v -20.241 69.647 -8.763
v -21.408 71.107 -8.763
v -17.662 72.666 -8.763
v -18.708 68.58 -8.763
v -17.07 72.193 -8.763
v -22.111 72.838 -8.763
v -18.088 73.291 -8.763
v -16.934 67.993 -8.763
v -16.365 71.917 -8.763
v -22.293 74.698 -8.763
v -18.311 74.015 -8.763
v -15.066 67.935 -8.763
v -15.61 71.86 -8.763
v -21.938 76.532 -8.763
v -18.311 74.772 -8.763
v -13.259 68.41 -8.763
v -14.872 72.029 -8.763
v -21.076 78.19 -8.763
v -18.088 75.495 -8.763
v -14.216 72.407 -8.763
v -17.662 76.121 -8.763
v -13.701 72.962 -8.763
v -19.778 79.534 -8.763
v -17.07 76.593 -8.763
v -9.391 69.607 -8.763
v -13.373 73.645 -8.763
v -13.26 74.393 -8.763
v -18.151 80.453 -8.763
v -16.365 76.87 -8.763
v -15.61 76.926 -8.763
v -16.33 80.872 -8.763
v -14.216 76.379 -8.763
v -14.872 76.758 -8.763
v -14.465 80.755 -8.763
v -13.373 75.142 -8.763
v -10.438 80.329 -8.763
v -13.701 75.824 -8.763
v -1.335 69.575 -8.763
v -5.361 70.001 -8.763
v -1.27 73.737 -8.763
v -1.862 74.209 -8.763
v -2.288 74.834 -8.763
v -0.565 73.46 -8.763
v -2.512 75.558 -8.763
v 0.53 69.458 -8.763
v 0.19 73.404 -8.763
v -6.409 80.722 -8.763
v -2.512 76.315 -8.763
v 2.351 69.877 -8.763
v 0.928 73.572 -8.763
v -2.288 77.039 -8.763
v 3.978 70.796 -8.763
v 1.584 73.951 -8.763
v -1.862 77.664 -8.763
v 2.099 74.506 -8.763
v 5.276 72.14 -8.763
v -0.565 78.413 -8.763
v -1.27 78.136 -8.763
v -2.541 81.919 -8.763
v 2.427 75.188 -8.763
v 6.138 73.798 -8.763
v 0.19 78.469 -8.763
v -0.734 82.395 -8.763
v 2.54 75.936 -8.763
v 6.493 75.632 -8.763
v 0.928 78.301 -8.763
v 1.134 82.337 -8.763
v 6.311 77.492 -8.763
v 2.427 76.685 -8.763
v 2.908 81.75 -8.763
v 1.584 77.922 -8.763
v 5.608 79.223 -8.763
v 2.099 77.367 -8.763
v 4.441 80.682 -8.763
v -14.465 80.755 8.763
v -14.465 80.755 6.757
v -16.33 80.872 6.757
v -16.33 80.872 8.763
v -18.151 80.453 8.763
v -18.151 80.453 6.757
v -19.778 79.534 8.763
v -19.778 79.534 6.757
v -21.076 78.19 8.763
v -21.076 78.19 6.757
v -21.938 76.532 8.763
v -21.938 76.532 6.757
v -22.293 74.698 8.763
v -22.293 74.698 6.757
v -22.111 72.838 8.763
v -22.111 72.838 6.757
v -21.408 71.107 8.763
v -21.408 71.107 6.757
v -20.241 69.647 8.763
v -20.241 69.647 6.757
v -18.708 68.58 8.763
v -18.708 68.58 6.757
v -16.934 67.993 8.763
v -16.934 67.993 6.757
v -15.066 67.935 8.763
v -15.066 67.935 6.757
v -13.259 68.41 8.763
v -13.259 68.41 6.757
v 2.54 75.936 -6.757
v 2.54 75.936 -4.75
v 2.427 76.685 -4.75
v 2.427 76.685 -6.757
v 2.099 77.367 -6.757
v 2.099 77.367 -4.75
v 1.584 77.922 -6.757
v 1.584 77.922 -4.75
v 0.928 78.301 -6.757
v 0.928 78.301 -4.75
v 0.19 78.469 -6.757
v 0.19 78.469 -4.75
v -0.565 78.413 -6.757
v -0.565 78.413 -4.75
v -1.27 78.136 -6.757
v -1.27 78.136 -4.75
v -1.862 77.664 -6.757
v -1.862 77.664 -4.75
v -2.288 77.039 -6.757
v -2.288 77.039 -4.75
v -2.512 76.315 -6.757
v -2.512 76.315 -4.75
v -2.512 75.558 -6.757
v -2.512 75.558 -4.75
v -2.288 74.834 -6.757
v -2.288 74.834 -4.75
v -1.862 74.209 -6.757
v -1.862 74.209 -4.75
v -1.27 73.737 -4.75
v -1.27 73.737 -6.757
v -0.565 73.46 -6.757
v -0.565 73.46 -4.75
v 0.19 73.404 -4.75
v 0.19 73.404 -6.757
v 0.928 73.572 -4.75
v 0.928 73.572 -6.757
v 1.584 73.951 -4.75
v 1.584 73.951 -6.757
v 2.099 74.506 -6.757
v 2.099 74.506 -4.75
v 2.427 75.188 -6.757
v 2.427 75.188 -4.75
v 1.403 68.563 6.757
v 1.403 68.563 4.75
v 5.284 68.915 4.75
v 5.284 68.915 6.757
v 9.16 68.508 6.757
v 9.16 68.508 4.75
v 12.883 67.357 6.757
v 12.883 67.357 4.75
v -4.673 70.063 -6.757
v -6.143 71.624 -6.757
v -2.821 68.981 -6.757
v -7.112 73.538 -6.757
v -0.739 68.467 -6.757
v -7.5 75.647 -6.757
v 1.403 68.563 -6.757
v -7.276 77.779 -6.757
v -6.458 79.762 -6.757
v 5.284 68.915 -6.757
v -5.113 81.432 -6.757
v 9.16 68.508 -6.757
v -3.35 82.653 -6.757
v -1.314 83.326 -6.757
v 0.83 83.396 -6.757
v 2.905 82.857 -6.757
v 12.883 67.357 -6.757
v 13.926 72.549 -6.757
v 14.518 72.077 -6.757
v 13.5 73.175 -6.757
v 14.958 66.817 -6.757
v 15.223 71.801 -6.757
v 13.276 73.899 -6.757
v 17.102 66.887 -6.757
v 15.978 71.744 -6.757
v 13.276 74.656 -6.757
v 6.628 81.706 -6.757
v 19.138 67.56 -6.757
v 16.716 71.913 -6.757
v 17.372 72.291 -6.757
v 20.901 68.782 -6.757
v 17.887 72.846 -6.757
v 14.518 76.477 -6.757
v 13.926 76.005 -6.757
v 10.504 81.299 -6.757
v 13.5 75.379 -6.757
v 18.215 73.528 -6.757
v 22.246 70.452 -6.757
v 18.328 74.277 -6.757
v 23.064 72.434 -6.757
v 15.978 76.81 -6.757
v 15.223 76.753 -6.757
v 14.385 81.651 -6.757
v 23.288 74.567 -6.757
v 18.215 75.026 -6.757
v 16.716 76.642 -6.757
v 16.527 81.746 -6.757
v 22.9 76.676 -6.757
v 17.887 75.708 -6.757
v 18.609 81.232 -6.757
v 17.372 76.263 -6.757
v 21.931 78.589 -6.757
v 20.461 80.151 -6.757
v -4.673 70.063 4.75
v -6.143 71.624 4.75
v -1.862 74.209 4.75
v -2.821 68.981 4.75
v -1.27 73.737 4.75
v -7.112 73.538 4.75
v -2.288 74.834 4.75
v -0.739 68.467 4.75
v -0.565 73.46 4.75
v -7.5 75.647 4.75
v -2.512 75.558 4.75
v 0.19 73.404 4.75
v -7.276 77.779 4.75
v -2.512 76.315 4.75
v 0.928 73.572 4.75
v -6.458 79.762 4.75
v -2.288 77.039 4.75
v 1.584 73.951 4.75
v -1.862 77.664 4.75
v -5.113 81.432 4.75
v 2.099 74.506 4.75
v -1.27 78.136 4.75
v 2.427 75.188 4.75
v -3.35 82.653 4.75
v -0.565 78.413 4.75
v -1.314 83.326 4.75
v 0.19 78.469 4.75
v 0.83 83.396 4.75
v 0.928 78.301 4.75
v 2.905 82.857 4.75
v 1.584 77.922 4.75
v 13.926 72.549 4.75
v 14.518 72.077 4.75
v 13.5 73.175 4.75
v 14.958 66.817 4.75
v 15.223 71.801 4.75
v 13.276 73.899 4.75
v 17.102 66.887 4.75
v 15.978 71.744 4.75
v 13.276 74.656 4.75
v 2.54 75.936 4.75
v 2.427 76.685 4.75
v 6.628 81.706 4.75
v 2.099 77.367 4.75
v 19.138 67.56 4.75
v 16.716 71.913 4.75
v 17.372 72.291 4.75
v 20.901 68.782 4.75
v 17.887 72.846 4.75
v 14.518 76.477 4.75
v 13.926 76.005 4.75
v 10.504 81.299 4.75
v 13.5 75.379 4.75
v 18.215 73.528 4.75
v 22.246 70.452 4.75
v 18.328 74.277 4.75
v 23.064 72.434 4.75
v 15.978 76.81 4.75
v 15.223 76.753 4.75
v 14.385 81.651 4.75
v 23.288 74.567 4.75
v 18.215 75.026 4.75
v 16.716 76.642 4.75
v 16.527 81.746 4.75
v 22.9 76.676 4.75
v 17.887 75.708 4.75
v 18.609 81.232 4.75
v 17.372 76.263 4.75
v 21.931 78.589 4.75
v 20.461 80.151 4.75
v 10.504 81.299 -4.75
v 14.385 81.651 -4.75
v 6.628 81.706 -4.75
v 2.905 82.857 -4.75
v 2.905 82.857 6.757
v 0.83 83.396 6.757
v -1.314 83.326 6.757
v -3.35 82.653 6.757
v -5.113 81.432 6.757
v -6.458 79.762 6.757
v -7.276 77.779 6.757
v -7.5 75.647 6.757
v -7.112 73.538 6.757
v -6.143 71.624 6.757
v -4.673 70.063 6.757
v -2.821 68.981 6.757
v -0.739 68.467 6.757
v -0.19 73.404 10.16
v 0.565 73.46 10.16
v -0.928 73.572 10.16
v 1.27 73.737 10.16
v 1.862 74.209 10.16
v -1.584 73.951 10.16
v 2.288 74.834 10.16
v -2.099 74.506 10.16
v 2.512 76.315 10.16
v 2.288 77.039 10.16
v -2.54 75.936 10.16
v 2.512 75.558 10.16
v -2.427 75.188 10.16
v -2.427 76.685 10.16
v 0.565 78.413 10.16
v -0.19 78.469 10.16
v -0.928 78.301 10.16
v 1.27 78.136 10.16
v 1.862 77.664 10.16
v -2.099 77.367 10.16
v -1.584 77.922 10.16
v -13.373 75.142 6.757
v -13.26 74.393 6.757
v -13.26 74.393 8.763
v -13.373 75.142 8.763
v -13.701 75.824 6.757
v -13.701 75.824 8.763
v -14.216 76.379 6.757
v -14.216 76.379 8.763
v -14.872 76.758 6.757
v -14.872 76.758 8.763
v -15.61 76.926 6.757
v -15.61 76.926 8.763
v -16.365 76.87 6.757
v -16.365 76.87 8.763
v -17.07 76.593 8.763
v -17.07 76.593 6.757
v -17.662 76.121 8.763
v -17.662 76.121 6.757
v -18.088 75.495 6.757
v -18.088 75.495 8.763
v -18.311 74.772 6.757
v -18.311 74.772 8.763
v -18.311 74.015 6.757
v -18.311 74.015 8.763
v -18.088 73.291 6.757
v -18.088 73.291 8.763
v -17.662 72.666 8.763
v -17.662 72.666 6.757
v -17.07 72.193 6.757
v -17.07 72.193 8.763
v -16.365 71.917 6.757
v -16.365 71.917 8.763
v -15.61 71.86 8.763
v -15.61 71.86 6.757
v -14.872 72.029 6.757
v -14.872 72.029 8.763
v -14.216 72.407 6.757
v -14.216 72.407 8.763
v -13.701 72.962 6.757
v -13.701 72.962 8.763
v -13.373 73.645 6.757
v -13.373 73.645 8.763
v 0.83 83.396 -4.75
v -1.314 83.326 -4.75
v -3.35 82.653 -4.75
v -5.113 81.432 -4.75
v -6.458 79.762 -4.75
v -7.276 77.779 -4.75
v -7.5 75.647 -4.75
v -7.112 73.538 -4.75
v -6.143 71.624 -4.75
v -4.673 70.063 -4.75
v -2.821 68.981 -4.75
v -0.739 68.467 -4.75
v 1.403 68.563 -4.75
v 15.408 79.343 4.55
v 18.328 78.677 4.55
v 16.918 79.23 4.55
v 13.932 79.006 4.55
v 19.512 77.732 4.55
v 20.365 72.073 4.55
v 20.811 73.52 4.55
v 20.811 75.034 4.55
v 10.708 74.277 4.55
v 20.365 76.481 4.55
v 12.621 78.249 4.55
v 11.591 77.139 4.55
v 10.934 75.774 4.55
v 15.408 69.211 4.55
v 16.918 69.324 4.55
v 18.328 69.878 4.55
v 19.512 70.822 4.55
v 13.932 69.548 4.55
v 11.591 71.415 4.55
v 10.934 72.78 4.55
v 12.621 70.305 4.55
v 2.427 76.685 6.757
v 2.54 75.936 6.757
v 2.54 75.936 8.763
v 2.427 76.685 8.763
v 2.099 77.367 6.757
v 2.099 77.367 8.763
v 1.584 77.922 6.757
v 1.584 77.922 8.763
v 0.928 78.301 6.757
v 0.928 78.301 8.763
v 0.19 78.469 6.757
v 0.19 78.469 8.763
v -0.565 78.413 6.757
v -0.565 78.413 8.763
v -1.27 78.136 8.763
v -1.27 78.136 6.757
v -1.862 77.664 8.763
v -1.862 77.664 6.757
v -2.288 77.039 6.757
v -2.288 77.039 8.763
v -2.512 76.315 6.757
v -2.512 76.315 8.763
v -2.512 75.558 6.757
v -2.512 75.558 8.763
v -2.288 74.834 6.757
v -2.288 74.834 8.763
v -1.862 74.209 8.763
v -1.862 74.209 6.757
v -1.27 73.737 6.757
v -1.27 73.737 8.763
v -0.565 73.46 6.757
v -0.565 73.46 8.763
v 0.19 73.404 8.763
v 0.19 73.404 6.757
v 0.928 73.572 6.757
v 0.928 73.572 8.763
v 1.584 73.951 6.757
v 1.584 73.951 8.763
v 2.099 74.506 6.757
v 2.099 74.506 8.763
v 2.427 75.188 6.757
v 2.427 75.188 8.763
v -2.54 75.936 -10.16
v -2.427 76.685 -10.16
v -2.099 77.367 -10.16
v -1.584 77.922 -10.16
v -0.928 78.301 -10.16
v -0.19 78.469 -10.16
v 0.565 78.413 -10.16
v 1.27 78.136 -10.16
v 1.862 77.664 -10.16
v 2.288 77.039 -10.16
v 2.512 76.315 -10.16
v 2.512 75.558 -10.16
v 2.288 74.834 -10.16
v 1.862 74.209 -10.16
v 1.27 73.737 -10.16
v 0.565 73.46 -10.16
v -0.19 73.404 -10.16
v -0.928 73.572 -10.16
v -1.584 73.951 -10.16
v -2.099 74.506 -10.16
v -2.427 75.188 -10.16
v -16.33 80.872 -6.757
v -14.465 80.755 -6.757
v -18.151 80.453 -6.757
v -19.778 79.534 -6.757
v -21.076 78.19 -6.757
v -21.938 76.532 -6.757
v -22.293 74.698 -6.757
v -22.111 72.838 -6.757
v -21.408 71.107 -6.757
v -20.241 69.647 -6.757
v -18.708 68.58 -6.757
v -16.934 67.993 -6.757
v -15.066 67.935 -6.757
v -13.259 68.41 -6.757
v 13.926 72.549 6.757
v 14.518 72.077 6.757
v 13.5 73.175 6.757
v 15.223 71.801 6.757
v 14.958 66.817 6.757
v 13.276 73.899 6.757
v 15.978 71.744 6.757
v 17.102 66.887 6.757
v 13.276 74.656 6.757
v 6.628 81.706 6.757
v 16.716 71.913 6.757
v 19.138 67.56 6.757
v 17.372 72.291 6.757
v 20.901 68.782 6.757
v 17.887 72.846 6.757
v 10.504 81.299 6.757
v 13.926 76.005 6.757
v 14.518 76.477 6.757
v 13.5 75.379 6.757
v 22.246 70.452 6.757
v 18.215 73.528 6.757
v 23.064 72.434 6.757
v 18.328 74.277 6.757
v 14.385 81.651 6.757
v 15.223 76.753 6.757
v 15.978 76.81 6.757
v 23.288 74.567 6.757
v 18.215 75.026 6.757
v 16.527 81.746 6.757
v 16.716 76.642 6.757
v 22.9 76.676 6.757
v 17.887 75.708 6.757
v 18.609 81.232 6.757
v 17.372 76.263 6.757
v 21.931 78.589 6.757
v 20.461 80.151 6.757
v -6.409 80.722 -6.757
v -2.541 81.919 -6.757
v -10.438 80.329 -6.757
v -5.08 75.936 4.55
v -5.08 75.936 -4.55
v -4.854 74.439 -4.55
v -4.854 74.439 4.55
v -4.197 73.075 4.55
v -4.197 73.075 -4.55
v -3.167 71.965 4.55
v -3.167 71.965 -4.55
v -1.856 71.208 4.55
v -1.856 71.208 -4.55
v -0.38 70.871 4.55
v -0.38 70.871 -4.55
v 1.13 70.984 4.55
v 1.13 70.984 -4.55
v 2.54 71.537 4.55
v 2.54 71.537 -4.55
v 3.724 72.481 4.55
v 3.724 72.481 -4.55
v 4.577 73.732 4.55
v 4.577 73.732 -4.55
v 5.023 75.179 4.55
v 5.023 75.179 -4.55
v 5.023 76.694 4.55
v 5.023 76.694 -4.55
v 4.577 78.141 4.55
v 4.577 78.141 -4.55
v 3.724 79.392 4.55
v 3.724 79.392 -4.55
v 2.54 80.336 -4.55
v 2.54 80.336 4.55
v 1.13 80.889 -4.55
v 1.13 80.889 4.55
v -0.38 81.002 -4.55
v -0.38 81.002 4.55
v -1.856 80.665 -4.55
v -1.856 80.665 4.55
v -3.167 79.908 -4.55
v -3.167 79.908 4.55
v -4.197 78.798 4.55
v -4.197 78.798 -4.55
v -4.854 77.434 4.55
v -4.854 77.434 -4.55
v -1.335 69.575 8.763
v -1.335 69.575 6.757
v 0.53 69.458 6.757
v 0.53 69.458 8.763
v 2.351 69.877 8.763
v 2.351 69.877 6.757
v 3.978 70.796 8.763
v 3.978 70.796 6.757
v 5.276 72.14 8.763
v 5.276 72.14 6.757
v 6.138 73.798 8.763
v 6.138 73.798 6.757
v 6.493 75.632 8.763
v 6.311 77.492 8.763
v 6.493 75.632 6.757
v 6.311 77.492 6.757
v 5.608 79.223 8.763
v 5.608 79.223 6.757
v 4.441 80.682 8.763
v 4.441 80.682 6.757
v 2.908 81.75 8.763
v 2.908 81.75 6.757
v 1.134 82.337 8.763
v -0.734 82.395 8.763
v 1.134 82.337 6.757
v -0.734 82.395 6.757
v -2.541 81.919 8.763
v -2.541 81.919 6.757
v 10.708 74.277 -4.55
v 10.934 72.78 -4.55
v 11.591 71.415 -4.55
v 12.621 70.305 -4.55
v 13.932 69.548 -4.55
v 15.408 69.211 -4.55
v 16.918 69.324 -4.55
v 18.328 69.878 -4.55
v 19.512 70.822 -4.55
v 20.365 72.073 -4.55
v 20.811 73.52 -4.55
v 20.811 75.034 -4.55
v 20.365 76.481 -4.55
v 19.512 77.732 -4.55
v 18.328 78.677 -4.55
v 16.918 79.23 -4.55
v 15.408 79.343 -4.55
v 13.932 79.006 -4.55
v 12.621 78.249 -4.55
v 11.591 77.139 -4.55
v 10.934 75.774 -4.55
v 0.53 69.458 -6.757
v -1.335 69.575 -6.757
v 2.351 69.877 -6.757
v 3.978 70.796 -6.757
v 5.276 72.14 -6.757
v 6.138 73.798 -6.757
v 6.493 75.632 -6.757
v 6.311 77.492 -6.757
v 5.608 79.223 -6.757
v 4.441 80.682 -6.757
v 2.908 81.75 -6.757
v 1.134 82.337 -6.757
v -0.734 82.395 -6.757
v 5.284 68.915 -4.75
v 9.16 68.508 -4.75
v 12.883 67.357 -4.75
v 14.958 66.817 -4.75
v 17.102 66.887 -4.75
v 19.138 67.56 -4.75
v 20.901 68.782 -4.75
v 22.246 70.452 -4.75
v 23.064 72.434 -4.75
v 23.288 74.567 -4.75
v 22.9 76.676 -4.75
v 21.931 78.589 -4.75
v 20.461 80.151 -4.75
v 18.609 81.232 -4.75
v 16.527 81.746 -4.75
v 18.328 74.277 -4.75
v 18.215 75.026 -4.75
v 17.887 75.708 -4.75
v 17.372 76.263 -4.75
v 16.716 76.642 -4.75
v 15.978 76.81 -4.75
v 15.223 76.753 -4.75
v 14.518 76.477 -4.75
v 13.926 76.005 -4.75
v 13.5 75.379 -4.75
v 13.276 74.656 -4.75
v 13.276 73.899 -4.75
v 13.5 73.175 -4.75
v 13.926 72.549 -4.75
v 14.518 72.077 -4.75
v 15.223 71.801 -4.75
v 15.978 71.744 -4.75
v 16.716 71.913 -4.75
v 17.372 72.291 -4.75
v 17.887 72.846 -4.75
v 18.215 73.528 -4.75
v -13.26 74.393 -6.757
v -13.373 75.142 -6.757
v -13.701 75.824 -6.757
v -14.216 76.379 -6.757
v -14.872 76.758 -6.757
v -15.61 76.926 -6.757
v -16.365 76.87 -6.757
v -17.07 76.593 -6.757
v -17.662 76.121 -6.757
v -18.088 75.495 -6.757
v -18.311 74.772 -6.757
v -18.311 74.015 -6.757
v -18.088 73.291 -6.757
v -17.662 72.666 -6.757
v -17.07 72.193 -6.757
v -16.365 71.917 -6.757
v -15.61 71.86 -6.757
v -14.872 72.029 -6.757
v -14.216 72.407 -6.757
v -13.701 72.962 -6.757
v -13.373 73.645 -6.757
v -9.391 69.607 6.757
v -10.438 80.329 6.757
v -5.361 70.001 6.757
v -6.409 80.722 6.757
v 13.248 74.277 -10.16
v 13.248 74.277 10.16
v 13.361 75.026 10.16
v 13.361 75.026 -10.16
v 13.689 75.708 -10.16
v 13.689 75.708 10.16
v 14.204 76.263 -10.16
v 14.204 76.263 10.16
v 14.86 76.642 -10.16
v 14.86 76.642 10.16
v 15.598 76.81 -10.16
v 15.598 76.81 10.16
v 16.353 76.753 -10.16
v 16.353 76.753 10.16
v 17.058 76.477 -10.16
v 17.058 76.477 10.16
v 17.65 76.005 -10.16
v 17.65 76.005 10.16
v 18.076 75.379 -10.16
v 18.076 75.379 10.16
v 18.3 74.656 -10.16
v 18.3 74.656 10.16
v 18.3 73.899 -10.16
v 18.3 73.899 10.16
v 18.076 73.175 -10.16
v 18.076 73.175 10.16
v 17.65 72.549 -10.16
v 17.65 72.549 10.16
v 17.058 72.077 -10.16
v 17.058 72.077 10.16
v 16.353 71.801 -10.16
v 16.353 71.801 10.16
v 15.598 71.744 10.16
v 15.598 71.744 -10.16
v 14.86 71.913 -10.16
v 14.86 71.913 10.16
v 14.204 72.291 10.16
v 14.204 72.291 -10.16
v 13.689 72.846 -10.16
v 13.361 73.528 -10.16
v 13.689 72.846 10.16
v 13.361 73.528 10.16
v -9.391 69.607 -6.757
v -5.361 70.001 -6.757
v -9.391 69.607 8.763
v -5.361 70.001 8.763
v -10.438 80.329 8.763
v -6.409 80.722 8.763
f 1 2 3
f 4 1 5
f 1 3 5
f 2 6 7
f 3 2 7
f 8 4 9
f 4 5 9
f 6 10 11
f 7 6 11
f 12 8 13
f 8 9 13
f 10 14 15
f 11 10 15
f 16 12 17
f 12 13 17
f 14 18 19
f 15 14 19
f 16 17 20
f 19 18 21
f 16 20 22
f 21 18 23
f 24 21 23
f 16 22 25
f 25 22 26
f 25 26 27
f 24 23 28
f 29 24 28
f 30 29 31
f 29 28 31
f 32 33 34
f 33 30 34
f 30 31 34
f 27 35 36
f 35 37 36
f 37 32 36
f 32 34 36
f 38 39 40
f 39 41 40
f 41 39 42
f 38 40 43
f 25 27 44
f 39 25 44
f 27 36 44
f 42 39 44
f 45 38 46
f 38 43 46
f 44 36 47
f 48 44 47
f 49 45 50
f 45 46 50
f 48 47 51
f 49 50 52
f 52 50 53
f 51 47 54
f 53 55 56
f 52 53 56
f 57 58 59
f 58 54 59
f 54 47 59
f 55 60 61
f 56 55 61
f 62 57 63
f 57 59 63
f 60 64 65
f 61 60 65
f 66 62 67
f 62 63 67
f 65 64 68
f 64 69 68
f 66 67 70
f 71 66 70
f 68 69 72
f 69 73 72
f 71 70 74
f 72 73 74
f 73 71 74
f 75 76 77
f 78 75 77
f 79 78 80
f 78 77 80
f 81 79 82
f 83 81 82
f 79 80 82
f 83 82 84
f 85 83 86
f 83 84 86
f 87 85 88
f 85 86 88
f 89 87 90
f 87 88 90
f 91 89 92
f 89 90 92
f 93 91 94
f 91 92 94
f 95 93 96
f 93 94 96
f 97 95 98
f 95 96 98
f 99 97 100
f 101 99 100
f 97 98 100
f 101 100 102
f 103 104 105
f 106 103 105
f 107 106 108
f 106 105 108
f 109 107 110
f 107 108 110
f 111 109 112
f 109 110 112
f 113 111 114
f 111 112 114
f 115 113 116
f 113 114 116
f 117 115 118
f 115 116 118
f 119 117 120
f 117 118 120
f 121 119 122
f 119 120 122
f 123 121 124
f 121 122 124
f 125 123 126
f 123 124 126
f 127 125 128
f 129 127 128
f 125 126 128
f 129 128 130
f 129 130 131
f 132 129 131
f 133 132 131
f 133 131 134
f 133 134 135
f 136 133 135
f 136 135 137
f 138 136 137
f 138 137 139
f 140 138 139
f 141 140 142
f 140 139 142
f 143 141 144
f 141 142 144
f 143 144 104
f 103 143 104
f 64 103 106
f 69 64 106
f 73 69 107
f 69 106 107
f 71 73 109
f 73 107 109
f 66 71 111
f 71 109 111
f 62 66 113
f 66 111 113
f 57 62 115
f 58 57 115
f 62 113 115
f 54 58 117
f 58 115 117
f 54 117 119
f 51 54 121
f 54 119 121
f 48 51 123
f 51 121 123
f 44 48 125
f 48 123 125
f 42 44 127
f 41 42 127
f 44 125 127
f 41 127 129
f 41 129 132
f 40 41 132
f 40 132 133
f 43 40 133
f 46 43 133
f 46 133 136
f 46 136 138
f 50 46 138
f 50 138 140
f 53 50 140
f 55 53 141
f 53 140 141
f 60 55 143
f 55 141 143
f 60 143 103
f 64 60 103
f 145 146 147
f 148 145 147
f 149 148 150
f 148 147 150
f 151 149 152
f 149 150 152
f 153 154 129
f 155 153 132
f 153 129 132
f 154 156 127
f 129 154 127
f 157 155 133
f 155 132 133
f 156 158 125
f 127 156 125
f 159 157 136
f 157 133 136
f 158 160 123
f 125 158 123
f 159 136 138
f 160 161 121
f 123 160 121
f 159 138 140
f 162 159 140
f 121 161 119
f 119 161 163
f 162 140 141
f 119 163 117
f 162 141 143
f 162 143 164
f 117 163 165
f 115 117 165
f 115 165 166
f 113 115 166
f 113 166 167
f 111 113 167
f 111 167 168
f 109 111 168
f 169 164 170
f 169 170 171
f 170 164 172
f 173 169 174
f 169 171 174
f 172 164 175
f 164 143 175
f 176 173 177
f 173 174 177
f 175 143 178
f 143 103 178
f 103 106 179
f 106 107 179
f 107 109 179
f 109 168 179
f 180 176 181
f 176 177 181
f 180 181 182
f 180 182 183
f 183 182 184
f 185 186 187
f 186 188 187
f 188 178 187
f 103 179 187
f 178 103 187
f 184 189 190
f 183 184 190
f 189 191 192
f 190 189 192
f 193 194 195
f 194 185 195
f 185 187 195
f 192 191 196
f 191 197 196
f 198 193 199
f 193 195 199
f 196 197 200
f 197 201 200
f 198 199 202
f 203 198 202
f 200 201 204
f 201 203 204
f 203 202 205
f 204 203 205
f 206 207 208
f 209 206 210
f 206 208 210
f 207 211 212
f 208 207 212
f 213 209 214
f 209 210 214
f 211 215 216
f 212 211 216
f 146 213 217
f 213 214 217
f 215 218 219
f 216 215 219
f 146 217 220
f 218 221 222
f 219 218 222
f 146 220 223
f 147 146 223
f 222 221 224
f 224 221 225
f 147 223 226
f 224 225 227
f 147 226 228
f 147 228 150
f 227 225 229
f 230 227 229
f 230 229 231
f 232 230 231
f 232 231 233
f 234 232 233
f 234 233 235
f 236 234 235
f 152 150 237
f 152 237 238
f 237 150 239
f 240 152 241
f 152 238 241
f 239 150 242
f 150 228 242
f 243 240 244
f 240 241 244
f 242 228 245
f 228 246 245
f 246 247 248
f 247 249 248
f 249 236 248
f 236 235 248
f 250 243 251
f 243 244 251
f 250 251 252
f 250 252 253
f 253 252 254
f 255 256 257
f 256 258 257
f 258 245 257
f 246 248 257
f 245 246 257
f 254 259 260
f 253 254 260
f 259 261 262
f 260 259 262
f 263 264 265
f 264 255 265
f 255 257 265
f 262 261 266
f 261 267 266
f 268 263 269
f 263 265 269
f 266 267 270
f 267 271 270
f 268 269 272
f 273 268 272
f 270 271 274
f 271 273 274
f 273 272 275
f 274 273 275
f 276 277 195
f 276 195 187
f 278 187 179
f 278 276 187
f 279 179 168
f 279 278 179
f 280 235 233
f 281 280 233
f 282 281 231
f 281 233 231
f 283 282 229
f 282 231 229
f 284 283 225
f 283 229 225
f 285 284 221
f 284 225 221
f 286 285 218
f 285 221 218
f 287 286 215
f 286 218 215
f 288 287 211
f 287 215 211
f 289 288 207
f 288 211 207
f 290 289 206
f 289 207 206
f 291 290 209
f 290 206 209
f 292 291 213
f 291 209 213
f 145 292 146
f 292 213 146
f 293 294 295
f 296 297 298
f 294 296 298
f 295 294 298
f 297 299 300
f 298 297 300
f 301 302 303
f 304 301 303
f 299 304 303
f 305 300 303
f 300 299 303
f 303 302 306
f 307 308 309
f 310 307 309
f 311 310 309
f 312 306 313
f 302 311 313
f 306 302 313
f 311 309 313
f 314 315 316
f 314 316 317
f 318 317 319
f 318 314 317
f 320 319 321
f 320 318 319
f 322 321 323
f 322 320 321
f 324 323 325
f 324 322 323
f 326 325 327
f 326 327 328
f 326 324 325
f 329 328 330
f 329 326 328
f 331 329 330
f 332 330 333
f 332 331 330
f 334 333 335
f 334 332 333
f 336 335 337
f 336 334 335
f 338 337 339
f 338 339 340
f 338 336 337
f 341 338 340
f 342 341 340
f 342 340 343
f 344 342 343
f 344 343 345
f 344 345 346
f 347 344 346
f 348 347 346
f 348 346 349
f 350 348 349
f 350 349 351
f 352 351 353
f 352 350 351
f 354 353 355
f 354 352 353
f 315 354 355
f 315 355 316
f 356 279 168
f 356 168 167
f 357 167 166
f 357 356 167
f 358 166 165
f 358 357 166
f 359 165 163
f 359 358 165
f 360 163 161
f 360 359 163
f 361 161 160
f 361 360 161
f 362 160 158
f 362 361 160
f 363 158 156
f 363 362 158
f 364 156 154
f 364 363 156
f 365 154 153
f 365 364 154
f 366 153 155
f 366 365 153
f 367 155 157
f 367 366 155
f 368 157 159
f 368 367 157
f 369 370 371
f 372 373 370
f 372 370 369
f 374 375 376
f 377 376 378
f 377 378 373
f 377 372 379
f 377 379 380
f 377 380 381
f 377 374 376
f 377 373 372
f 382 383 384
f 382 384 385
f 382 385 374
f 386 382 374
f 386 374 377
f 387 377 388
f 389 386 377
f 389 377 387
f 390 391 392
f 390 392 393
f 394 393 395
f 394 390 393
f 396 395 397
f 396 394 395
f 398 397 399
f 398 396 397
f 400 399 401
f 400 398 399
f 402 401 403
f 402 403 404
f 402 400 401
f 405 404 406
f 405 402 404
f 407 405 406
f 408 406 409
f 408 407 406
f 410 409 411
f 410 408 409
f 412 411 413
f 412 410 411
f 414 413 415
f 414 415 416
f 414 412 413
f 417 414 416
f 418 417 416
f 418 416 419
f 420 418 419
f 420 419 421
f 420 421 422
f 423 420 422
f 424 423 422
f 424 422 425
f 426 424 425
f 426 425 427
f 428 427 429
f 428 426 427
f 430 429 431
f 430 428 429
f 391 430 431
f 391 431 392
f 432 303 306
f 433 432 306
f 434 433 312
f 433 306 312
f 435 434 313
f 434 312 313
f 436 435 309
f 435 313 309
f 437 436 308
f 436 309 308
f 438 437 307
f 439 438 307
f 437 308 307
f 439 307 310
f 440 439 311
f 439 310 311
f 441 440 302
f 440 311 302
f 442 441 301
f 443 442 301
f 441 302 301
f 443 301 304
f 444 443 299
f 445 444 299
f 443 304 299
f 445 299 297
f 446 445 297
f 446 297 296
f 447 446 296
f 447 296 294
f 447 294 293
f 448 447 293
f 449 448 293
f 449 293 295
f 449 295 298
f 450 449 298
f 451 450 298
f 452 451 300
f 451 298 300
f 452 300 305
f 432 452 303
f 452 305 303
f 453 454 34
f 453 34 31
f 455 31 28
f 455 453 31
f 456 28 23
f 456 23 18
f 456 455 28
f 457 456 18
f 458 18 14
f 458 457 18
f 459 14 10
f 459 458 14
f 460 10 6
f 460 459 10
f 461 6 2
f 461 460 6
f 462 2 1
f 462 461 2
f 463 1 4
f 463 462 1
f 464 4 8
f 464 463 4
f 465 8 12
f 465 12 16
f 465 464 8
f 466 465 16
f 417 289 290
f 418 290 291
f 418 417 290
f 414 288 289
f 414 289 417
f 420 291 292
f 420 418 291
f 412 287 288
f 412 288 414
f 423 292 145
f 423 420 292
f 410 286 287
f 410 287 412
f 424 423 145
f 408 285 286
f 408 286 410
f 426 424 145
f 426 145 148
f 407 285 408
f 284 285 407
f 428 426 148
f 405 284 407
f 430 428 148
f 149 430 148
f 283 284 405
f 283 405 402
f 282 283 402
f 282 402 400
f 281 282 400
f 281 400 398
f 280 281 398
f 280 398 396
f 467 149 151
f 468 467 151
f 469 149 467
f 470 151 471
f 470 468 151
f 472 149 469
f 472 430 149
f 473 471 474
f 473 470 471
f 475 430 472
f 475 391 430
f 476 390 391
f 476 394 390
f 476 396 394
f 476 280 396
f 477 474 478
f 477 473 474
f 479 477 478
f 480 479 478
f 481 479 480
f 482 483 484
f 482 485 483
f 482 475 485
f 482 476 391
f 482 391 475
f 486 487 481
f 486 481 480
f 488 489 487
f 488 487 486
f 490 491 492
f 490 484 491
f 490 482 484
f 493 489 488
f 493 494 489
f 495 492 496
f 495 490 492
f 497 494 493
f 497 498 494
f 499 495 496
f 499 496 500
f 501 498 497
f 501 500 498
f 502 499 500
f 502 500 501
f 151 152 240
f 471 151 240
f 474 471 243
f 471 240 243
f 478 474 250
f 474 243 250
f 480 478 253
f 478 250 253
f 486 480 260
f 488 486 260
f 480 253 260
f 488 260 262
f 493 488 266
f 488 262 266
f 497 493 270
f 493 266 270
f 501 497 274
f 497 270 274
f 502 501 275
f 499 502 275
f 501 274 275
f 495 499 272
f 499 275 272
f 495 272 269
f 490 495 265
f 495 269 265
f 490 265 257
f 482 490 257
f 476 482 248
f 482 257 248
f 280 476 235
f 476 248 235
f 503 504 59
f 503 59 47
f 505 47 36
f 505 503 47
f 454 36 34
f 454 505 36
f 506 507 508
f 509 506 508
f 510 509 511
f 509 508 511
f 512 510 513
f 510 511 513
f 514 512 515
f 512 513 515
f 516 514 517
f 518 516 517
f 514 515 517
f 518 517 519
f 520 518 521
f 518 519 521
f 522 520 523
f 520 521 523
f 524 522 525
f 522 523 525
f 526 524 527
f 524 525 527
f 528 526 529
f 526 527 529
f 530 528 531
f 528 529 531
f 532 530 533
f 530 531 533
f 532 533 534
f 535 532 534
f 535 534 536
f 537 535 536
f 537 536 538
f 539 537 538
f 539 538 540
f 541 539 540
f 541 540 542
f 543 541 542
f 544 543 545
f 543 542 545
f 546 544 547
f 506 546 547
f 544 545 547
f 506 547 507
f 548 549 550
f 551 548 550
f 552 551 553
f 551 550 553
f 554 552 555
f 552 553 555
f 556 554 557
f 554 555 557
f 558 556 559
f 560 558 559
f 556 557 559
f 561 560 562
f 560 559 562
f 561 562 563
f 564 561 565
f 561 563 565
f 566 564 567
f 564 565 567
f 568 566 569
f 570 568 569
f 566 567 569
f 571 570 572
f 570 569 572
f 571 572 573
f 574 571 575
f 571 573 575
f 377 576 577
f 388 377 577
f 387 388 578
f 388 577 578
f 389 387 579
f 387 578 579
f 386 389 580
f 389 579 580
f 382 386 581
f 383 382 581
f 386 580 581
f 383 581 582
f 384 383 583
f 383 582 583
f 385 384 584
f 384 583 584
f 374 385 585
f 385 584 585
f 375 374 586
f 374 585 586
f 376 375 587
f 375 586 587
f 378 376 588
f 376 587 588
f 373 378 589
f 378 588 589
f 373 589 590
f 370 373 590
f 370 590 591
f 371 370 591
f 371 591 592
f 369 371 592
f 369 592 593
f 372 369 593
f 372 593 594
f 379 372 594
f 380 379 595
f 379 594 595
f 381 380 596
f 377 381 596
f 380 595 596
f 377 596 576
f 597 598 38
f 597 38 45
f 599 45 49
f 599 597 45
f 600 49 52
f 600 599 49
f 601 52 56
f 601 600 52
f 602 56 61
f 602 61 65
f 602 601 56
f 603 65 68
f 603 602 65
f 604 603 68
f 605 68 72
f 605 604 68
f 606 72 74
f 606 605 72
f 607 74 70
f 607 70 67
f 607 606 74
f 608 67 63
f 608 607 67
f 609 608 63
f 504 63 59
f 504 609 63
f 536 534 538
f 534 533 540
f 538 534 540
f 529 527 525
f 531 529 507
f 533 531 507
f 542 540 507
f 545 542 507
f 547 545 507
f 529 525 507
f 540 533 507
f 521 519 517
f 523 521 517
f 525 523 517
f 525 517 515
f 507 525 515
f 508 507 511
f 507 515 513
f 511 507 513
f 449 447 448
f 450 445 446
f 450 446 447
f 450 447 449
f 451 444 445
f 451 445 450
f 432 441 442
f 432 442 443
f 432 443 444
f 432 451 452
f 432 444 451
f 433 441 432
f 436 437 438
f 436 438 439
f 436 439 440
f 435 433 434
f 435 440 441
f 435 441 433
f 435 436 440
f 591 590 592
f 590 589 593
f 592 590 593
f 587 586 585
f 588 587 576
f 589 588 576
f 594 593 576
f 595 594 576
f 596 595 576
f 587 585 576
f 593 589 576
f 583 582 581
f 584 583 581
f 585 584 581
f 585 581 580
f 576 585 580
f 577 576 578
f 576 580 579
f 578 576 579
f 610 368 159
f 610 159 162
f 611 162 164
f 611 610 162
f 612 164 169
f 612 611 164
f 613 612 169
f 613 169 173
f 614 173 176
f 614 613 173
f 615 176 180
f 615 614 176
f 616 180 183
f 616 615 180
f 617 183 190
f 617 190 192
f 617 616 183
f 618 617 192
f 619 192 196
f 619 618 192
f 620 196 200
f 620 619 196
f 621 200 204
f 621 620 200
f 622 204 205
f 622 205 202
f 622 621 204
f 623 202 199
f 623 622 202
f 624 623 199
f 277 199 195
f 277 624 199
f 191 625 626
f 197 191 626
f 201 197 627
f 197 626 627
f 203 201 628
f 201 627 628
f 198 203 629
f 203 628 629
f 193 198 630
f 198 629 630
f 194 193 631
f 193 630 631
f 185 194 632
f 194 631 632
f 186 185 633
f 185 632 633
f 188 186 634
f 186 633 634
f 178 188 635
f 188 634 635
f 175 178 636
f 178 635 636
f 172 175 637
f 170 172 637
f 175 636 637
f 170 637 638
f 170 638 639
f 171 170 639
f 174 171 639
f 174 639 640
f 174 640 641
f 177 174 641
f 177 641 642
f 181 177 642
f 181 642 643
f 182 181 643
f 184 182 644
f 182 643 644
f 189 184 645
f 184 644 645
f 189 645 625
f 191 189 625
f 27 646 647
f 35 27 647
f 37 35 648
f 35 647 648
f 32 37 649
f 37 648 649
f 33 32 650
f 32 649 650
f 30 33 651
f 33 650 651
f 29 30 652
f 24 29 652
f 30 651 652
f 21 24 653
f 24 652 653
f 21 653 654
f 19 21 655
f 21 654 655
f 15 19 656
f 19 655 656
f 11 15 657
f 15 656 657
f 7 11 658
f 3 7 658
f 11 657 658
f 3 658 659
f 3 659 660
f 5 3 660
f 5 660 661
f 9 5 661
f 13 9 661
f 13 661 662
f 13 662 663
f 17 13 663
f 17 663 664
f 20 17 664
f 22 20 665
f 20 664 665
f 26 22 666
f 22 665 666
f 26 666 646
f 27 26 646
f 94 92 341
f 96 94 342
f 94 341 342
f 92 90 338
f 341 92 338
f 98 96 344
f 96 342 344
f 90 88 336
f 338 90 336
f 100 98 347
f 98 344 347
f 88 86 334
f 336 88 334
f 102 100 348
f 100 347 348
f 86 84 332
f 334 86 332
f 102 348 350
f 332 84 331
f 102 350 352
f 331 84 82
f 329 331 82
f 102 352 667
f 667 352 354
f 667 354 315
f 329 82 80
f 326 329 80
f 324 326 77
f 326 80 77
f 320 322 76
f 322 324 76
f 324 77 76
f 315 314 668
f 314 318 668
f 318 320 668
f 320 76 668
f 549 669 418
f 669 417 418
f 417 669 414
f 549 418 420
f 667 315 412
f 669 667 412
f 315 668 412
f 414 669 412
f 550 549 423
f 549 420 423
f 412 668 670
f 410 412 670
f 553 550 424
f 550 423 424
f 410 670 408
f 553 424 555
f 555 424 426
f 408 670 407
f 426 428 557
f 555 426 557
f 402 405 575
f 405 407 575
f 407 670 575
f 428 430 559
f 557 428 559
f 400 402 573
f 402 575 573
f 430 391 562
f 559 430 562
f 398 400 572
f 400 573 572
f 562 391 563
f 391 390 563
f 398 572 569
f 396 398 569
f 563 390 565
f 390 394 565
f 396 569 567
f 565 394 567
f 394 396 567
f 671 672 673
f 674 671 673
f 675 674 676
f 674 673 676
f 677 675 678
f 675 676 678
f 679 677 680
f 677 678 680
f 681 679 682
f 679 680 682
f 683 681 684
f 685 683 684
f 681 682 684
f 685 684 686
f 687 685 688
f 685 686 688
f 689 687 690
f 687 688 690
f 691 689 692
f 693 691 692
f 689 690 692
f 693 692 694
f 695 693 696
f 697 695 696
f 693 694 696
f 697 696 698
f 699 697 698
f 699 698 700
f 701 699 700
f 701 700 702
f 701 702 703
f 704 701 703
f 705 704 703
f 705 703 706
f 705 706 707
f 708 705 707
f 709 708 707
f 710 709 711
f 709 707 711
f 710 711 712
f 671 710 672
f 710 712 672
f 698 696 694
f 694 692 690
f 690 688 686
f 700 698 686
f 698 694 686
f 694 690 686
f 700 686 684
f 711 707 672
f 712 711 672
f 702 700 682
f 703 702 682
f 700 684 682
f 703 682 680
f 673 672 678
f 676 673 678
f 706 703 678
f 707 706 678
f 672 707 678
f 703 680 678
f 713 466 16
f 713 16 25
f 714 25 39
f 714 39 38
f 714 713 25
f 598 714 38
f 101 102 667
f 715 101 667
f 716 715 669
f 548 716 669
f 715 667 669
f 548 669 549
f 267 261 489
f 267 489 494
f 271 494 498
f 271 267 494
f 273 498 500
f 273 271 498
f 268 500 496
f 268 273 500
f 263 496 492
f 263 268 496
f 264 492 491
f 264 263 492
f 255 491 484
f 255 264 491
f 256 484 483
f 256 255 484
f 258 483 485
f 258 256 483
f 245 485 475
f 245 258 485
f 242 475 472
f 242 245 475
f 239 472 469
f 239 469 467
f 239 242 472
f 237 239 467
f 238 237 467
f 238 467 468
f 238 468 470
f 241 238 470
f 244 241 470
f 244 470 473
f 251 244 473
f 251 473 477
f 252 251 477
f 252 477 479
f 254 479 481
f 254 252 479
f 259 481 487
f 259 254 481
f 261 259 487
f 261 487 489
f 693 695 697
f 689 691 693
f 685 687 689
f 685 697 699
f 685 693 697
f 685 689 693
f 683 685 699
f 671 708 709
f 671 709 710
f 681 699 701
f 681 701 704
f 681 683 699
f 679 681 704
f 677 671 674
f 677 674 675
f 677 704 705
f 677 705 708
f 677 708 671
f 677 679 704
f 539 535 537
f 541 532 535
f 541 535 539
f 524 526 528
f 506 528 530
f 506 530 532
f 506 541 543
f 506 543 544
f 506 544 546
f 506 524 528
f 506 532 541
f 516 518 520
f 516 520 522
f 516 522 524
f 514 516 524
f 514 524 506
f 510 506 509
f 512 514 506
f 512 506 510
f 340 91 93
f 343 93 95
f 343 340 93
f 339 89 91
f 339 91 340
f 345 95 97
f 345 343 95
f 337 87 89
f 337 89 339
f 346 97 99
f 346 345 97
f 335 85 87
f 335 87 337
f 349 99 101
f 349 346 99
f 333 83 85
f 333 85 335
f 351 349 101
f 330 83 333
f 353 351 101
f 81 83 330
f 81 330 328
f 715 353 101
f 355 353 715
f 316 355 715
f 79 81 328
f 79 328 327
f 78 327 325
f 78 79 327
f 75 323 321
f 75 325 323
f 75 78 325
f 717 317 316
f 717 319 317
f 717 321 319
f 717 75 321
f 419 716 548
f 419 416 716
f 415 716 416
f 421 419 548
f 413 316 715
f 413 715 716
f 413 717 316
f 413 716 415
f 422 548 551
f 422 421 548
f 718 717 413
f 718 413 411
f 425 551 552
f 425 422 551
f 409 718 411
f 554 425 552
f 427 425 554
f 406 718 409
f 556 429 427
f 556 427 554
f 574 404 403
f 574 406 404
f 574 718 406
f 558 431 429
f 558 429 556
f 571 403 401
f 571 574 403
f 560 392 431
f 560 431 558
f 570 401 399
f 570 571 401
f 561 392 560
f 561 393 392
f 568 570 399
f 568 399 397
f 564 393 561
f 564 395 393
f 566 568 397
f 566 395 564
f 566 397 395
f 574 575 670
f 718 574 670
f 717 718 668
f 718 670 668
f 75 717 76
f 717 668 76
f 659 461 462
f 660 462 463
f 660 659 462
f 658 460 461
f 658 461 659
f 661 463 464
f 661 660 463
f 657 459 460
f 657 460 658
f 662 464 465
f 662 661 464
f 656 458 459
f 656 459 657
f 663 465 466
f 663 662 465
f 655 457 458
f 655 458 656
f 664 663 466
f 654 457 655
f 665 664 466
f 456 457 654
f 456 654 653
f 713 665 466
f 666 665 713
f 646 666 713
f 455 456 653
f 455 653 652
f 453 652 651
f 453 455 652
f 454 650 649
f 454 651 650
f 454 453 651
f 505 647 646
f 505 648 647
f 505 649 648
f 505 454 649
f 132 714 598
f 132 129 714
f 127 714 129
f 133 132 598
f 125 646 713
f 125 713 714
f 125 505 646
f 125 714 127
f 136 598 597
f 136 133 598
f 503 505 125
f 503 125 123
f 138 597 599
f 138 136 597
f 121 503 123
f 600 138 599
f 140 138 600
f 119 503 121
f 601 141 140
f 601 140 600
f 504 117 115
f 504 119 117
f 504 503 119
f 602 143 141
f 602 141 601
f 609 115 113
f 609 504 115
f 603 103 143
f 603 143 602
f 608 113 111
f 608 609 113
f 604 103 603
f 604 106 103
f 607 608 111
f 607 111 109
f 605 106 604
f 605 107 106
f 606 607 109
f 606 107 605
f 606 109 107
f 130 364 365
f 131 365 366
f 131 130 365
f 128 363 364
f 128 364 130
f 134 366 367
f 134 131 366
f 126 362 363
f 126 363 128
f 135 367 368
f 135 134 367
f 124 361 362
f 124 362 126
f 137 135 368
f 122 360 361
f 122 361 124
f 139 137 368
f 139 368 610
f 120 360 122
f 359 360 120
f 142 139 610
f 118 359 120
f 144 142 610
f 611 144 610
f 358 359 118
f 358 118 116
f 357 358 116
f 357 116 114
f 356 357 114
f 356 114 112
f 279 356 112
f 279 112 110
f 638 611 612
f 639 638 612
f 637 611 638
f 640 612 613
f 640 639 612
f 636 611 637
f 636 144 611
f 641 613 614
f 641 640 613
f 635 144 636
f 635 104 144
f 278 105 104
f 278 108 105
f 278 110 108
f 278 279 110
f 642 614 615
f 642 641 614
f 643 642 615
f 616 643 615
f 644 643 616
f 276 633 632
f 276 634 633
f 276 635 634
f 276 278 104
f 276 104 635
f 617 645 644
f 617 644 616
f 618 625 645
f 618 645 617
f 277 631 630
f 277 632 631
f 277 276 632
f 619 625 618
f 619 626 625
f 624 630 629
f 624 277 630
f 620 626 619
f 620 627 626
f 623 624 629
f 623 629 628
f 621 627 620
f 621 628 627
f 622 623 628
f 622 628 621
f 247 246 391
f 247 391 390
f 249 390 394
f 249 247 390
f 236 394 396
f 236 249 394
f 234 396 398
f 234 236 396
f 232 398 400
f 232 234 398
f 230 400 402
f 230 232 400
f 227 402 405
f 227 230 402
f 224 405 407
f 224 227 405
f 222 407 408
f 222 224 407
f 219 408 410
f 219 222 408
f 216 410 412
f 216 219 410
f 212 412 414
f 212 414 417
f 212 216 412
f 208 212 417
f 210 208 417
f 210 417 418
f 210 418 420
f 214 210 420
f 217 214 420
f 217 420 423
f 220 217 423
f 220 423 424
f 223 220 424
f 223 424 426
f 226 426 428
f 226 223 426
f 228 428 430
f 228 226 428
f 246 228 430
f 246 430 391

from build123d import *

# Parameters (mm, degrees)
BOSS_EXTRUDE1_START        = 4.75
SKETCH1_R                  = 2.54
BOSS_EXTRUDE1_DEPTH        = 2.0066
SKETCH2_R                  = 2.54
BOSS_EXTRUDE2_DEPTH        = 2.0066
BOSS_EXTRUDE3_DEPTH        = 10.16
BOSS_EXTRUDE3_DEPTH_BACK   = 10.16
SKETCH3_R                  = 2.54
BOSS_EXTRUDE3_2_DEPTH      = 10.16
BOSS_EXTRUDE3_2_DEPTH_BACK = 10.16
BOSS_EXTRUDE4_DEPTH        = 4.55
BOSS_EXTRUDE4_DEPTH_BACK   = 4.55
SKETCH4_R                  = 5.08
BOSS_EXTRUDE4_2_DEPTH      = 4.55
BOSS_EXTRUDE4_2_DEPTH_BACK = 4.55


with BuildPart() as part:
    # Sketch1 → Boss-Extrude1 (new body)
    with BuildSketch(Plane.XY.offset(BOSS_EXTRUDE1_START)):
        with BuildLine():
            ThreePointArc((2.905282898, 82.857111517), (-7.464583257, 76.721056751), (1.402924463, 68.563079122))
            ThreePointArc((1.402924463, 68.563079122), (7.231777772, 68.805994183), (12.882752755, 67.356504491))
            ThreePointArc((12.882752755, 67.356504491), (23.252618909, 73.492559257), (14.38511119, 81.650536886))
            ThreePointArc((14.38511119, 81.650536886), (8.556257881, 81.407621825), (2.905282898, 82.857111517))
        make_face()
        with Locations((0, 75.9365)):
            Circle(SKETCH1_R, mode=Mode.SUBTRACT)
        with Locations((15.788035653, 74.277116008)):
            Circle(SKETCH1_R, mode=Mode.SUBTRACT)
    extrude(amount=BOSS_EXTRUDE1_DEPTH)


with BuildPart() as body_2:
    # Sketch2 → Boss-Extrude2 (new body)
    with BuildSketch(Plane.XY.offset(6.7566)):
        with BuildLine():
            ThreePointArc((-1.334815218, 69.575032533), (6.46921099, 76.568409147), (-2.540608347, 81.91941812))
            ThreePointArc((-2.540608347, 81.91941812), (-8.413528963, 80.423132366), (-14.464988546, 80.754650897))
            ThreePointArc((-14.464988546, 80.754650897), (-22.269014753, 73.761274284), (-13.259195417, 68.41026531))
            ThreePointArc((-13.259195417, 68.41026531), (-7.386274801, 69.906551064), (-1.334815218, 69.575032533))
        make_face()
        with Locations((0, 75.9365)):
            Circle(SKETCH2_R, mode=Mode.SUBTRACT)
        with Locations((-15.799803764, 74.39318343)):
            Circle(SKETCH2_R, mode=Mode.SUBTRACT)
    extrude(amount=BOSS_EXTRUDE2_DEPTH)


with BuildPart() as body_3:
    # Mirror1: mirrored copy
    add(body_2.part.mirror(Plane.XY))


with BuildPart() as body_4:
    # Mirror1 2: mirrored copy
    add(part.part.mirror(Plane.XY))


with BuildPart() as body_5:
    # Sketch3 → Boss-Extrude3 (new, two sides: drawn at the far end of the back side and taken through both)
    with BuildSketch(Plane(origin=(0, 0, 0), x_dir=(-1, 0, 0), z_dir=(0, 0, -1)).offset(-BOSS_EXTRUDE3_DEPTH_BACK)):
        with Locations((0, 75.9365)):
            Circle(SKETCH3_R)
    extrude(amount=BOSS_EXTRUDE3_DEPTH + BOSS_EXTRUDE3_DEPTH_BACK)


with BuildPart() as body_6:
    # Sketch3 → Boss-Extrude3 2 (new, two sides: drawn at the far end of the back side and taken through both)
    with BuildSketch(Plane(origin=(0, 0, 0), x_dir=(-1, 0, 0), z_dir=(0, 0, -1)).offset(-BOSS_EXTRUDE3_2_DEPTH_BACK)):
        with Locations((-15.788035653, 74.277116008)):
            Circle(SKETCH3_R)
    extrude(amount=BOSS_EXTRUDE3_2_DEPTH + BOSS_EXTRUDE3_2_DEPTH_BACK)


with BuildPart() as body_7:
    # Sketch4 → Boss-Extrude4 (new, two sides: drawn at the far end of the back side and taken through both)
    with BuildSketch(Plane.XY.offset(-BOSS_EXTRUDE4_DEPTH_BACK)):
        with Locations(Location((0, 75.9365, 0), (0, 0, 180))):
            Circle(SKETCH4_R)
    extrude(amount=BOSS_EXTRUDE4_DEPTH + BOSS_EXTRUDE4_DEPTH_BACK)


with BuildPart() as body_8:
    # Sketch4 → Boss-Extrude4 2 (new, two sides: drawn at the far end of the back side and taken through both)
    with BuildSketch(Plane.XY.offset(-BOSS_EXTRUDE4_2_DEPTH_BACK)):
        with Locations(Location((15.788035653, 74.277116008, 0), (0, 0, 180))):
            Circle(SKETCH4_R)
    extrude(amount=BOSS_EXTRUDE4_2_DEPTH + BOSS_EXTRUDE4_2_DEPTH_BACK)


solid = Compound([part.part, body_2.part, body_3.part, body_4.part, body_5.part, body_6.part, body_7.part, body_8.part])
